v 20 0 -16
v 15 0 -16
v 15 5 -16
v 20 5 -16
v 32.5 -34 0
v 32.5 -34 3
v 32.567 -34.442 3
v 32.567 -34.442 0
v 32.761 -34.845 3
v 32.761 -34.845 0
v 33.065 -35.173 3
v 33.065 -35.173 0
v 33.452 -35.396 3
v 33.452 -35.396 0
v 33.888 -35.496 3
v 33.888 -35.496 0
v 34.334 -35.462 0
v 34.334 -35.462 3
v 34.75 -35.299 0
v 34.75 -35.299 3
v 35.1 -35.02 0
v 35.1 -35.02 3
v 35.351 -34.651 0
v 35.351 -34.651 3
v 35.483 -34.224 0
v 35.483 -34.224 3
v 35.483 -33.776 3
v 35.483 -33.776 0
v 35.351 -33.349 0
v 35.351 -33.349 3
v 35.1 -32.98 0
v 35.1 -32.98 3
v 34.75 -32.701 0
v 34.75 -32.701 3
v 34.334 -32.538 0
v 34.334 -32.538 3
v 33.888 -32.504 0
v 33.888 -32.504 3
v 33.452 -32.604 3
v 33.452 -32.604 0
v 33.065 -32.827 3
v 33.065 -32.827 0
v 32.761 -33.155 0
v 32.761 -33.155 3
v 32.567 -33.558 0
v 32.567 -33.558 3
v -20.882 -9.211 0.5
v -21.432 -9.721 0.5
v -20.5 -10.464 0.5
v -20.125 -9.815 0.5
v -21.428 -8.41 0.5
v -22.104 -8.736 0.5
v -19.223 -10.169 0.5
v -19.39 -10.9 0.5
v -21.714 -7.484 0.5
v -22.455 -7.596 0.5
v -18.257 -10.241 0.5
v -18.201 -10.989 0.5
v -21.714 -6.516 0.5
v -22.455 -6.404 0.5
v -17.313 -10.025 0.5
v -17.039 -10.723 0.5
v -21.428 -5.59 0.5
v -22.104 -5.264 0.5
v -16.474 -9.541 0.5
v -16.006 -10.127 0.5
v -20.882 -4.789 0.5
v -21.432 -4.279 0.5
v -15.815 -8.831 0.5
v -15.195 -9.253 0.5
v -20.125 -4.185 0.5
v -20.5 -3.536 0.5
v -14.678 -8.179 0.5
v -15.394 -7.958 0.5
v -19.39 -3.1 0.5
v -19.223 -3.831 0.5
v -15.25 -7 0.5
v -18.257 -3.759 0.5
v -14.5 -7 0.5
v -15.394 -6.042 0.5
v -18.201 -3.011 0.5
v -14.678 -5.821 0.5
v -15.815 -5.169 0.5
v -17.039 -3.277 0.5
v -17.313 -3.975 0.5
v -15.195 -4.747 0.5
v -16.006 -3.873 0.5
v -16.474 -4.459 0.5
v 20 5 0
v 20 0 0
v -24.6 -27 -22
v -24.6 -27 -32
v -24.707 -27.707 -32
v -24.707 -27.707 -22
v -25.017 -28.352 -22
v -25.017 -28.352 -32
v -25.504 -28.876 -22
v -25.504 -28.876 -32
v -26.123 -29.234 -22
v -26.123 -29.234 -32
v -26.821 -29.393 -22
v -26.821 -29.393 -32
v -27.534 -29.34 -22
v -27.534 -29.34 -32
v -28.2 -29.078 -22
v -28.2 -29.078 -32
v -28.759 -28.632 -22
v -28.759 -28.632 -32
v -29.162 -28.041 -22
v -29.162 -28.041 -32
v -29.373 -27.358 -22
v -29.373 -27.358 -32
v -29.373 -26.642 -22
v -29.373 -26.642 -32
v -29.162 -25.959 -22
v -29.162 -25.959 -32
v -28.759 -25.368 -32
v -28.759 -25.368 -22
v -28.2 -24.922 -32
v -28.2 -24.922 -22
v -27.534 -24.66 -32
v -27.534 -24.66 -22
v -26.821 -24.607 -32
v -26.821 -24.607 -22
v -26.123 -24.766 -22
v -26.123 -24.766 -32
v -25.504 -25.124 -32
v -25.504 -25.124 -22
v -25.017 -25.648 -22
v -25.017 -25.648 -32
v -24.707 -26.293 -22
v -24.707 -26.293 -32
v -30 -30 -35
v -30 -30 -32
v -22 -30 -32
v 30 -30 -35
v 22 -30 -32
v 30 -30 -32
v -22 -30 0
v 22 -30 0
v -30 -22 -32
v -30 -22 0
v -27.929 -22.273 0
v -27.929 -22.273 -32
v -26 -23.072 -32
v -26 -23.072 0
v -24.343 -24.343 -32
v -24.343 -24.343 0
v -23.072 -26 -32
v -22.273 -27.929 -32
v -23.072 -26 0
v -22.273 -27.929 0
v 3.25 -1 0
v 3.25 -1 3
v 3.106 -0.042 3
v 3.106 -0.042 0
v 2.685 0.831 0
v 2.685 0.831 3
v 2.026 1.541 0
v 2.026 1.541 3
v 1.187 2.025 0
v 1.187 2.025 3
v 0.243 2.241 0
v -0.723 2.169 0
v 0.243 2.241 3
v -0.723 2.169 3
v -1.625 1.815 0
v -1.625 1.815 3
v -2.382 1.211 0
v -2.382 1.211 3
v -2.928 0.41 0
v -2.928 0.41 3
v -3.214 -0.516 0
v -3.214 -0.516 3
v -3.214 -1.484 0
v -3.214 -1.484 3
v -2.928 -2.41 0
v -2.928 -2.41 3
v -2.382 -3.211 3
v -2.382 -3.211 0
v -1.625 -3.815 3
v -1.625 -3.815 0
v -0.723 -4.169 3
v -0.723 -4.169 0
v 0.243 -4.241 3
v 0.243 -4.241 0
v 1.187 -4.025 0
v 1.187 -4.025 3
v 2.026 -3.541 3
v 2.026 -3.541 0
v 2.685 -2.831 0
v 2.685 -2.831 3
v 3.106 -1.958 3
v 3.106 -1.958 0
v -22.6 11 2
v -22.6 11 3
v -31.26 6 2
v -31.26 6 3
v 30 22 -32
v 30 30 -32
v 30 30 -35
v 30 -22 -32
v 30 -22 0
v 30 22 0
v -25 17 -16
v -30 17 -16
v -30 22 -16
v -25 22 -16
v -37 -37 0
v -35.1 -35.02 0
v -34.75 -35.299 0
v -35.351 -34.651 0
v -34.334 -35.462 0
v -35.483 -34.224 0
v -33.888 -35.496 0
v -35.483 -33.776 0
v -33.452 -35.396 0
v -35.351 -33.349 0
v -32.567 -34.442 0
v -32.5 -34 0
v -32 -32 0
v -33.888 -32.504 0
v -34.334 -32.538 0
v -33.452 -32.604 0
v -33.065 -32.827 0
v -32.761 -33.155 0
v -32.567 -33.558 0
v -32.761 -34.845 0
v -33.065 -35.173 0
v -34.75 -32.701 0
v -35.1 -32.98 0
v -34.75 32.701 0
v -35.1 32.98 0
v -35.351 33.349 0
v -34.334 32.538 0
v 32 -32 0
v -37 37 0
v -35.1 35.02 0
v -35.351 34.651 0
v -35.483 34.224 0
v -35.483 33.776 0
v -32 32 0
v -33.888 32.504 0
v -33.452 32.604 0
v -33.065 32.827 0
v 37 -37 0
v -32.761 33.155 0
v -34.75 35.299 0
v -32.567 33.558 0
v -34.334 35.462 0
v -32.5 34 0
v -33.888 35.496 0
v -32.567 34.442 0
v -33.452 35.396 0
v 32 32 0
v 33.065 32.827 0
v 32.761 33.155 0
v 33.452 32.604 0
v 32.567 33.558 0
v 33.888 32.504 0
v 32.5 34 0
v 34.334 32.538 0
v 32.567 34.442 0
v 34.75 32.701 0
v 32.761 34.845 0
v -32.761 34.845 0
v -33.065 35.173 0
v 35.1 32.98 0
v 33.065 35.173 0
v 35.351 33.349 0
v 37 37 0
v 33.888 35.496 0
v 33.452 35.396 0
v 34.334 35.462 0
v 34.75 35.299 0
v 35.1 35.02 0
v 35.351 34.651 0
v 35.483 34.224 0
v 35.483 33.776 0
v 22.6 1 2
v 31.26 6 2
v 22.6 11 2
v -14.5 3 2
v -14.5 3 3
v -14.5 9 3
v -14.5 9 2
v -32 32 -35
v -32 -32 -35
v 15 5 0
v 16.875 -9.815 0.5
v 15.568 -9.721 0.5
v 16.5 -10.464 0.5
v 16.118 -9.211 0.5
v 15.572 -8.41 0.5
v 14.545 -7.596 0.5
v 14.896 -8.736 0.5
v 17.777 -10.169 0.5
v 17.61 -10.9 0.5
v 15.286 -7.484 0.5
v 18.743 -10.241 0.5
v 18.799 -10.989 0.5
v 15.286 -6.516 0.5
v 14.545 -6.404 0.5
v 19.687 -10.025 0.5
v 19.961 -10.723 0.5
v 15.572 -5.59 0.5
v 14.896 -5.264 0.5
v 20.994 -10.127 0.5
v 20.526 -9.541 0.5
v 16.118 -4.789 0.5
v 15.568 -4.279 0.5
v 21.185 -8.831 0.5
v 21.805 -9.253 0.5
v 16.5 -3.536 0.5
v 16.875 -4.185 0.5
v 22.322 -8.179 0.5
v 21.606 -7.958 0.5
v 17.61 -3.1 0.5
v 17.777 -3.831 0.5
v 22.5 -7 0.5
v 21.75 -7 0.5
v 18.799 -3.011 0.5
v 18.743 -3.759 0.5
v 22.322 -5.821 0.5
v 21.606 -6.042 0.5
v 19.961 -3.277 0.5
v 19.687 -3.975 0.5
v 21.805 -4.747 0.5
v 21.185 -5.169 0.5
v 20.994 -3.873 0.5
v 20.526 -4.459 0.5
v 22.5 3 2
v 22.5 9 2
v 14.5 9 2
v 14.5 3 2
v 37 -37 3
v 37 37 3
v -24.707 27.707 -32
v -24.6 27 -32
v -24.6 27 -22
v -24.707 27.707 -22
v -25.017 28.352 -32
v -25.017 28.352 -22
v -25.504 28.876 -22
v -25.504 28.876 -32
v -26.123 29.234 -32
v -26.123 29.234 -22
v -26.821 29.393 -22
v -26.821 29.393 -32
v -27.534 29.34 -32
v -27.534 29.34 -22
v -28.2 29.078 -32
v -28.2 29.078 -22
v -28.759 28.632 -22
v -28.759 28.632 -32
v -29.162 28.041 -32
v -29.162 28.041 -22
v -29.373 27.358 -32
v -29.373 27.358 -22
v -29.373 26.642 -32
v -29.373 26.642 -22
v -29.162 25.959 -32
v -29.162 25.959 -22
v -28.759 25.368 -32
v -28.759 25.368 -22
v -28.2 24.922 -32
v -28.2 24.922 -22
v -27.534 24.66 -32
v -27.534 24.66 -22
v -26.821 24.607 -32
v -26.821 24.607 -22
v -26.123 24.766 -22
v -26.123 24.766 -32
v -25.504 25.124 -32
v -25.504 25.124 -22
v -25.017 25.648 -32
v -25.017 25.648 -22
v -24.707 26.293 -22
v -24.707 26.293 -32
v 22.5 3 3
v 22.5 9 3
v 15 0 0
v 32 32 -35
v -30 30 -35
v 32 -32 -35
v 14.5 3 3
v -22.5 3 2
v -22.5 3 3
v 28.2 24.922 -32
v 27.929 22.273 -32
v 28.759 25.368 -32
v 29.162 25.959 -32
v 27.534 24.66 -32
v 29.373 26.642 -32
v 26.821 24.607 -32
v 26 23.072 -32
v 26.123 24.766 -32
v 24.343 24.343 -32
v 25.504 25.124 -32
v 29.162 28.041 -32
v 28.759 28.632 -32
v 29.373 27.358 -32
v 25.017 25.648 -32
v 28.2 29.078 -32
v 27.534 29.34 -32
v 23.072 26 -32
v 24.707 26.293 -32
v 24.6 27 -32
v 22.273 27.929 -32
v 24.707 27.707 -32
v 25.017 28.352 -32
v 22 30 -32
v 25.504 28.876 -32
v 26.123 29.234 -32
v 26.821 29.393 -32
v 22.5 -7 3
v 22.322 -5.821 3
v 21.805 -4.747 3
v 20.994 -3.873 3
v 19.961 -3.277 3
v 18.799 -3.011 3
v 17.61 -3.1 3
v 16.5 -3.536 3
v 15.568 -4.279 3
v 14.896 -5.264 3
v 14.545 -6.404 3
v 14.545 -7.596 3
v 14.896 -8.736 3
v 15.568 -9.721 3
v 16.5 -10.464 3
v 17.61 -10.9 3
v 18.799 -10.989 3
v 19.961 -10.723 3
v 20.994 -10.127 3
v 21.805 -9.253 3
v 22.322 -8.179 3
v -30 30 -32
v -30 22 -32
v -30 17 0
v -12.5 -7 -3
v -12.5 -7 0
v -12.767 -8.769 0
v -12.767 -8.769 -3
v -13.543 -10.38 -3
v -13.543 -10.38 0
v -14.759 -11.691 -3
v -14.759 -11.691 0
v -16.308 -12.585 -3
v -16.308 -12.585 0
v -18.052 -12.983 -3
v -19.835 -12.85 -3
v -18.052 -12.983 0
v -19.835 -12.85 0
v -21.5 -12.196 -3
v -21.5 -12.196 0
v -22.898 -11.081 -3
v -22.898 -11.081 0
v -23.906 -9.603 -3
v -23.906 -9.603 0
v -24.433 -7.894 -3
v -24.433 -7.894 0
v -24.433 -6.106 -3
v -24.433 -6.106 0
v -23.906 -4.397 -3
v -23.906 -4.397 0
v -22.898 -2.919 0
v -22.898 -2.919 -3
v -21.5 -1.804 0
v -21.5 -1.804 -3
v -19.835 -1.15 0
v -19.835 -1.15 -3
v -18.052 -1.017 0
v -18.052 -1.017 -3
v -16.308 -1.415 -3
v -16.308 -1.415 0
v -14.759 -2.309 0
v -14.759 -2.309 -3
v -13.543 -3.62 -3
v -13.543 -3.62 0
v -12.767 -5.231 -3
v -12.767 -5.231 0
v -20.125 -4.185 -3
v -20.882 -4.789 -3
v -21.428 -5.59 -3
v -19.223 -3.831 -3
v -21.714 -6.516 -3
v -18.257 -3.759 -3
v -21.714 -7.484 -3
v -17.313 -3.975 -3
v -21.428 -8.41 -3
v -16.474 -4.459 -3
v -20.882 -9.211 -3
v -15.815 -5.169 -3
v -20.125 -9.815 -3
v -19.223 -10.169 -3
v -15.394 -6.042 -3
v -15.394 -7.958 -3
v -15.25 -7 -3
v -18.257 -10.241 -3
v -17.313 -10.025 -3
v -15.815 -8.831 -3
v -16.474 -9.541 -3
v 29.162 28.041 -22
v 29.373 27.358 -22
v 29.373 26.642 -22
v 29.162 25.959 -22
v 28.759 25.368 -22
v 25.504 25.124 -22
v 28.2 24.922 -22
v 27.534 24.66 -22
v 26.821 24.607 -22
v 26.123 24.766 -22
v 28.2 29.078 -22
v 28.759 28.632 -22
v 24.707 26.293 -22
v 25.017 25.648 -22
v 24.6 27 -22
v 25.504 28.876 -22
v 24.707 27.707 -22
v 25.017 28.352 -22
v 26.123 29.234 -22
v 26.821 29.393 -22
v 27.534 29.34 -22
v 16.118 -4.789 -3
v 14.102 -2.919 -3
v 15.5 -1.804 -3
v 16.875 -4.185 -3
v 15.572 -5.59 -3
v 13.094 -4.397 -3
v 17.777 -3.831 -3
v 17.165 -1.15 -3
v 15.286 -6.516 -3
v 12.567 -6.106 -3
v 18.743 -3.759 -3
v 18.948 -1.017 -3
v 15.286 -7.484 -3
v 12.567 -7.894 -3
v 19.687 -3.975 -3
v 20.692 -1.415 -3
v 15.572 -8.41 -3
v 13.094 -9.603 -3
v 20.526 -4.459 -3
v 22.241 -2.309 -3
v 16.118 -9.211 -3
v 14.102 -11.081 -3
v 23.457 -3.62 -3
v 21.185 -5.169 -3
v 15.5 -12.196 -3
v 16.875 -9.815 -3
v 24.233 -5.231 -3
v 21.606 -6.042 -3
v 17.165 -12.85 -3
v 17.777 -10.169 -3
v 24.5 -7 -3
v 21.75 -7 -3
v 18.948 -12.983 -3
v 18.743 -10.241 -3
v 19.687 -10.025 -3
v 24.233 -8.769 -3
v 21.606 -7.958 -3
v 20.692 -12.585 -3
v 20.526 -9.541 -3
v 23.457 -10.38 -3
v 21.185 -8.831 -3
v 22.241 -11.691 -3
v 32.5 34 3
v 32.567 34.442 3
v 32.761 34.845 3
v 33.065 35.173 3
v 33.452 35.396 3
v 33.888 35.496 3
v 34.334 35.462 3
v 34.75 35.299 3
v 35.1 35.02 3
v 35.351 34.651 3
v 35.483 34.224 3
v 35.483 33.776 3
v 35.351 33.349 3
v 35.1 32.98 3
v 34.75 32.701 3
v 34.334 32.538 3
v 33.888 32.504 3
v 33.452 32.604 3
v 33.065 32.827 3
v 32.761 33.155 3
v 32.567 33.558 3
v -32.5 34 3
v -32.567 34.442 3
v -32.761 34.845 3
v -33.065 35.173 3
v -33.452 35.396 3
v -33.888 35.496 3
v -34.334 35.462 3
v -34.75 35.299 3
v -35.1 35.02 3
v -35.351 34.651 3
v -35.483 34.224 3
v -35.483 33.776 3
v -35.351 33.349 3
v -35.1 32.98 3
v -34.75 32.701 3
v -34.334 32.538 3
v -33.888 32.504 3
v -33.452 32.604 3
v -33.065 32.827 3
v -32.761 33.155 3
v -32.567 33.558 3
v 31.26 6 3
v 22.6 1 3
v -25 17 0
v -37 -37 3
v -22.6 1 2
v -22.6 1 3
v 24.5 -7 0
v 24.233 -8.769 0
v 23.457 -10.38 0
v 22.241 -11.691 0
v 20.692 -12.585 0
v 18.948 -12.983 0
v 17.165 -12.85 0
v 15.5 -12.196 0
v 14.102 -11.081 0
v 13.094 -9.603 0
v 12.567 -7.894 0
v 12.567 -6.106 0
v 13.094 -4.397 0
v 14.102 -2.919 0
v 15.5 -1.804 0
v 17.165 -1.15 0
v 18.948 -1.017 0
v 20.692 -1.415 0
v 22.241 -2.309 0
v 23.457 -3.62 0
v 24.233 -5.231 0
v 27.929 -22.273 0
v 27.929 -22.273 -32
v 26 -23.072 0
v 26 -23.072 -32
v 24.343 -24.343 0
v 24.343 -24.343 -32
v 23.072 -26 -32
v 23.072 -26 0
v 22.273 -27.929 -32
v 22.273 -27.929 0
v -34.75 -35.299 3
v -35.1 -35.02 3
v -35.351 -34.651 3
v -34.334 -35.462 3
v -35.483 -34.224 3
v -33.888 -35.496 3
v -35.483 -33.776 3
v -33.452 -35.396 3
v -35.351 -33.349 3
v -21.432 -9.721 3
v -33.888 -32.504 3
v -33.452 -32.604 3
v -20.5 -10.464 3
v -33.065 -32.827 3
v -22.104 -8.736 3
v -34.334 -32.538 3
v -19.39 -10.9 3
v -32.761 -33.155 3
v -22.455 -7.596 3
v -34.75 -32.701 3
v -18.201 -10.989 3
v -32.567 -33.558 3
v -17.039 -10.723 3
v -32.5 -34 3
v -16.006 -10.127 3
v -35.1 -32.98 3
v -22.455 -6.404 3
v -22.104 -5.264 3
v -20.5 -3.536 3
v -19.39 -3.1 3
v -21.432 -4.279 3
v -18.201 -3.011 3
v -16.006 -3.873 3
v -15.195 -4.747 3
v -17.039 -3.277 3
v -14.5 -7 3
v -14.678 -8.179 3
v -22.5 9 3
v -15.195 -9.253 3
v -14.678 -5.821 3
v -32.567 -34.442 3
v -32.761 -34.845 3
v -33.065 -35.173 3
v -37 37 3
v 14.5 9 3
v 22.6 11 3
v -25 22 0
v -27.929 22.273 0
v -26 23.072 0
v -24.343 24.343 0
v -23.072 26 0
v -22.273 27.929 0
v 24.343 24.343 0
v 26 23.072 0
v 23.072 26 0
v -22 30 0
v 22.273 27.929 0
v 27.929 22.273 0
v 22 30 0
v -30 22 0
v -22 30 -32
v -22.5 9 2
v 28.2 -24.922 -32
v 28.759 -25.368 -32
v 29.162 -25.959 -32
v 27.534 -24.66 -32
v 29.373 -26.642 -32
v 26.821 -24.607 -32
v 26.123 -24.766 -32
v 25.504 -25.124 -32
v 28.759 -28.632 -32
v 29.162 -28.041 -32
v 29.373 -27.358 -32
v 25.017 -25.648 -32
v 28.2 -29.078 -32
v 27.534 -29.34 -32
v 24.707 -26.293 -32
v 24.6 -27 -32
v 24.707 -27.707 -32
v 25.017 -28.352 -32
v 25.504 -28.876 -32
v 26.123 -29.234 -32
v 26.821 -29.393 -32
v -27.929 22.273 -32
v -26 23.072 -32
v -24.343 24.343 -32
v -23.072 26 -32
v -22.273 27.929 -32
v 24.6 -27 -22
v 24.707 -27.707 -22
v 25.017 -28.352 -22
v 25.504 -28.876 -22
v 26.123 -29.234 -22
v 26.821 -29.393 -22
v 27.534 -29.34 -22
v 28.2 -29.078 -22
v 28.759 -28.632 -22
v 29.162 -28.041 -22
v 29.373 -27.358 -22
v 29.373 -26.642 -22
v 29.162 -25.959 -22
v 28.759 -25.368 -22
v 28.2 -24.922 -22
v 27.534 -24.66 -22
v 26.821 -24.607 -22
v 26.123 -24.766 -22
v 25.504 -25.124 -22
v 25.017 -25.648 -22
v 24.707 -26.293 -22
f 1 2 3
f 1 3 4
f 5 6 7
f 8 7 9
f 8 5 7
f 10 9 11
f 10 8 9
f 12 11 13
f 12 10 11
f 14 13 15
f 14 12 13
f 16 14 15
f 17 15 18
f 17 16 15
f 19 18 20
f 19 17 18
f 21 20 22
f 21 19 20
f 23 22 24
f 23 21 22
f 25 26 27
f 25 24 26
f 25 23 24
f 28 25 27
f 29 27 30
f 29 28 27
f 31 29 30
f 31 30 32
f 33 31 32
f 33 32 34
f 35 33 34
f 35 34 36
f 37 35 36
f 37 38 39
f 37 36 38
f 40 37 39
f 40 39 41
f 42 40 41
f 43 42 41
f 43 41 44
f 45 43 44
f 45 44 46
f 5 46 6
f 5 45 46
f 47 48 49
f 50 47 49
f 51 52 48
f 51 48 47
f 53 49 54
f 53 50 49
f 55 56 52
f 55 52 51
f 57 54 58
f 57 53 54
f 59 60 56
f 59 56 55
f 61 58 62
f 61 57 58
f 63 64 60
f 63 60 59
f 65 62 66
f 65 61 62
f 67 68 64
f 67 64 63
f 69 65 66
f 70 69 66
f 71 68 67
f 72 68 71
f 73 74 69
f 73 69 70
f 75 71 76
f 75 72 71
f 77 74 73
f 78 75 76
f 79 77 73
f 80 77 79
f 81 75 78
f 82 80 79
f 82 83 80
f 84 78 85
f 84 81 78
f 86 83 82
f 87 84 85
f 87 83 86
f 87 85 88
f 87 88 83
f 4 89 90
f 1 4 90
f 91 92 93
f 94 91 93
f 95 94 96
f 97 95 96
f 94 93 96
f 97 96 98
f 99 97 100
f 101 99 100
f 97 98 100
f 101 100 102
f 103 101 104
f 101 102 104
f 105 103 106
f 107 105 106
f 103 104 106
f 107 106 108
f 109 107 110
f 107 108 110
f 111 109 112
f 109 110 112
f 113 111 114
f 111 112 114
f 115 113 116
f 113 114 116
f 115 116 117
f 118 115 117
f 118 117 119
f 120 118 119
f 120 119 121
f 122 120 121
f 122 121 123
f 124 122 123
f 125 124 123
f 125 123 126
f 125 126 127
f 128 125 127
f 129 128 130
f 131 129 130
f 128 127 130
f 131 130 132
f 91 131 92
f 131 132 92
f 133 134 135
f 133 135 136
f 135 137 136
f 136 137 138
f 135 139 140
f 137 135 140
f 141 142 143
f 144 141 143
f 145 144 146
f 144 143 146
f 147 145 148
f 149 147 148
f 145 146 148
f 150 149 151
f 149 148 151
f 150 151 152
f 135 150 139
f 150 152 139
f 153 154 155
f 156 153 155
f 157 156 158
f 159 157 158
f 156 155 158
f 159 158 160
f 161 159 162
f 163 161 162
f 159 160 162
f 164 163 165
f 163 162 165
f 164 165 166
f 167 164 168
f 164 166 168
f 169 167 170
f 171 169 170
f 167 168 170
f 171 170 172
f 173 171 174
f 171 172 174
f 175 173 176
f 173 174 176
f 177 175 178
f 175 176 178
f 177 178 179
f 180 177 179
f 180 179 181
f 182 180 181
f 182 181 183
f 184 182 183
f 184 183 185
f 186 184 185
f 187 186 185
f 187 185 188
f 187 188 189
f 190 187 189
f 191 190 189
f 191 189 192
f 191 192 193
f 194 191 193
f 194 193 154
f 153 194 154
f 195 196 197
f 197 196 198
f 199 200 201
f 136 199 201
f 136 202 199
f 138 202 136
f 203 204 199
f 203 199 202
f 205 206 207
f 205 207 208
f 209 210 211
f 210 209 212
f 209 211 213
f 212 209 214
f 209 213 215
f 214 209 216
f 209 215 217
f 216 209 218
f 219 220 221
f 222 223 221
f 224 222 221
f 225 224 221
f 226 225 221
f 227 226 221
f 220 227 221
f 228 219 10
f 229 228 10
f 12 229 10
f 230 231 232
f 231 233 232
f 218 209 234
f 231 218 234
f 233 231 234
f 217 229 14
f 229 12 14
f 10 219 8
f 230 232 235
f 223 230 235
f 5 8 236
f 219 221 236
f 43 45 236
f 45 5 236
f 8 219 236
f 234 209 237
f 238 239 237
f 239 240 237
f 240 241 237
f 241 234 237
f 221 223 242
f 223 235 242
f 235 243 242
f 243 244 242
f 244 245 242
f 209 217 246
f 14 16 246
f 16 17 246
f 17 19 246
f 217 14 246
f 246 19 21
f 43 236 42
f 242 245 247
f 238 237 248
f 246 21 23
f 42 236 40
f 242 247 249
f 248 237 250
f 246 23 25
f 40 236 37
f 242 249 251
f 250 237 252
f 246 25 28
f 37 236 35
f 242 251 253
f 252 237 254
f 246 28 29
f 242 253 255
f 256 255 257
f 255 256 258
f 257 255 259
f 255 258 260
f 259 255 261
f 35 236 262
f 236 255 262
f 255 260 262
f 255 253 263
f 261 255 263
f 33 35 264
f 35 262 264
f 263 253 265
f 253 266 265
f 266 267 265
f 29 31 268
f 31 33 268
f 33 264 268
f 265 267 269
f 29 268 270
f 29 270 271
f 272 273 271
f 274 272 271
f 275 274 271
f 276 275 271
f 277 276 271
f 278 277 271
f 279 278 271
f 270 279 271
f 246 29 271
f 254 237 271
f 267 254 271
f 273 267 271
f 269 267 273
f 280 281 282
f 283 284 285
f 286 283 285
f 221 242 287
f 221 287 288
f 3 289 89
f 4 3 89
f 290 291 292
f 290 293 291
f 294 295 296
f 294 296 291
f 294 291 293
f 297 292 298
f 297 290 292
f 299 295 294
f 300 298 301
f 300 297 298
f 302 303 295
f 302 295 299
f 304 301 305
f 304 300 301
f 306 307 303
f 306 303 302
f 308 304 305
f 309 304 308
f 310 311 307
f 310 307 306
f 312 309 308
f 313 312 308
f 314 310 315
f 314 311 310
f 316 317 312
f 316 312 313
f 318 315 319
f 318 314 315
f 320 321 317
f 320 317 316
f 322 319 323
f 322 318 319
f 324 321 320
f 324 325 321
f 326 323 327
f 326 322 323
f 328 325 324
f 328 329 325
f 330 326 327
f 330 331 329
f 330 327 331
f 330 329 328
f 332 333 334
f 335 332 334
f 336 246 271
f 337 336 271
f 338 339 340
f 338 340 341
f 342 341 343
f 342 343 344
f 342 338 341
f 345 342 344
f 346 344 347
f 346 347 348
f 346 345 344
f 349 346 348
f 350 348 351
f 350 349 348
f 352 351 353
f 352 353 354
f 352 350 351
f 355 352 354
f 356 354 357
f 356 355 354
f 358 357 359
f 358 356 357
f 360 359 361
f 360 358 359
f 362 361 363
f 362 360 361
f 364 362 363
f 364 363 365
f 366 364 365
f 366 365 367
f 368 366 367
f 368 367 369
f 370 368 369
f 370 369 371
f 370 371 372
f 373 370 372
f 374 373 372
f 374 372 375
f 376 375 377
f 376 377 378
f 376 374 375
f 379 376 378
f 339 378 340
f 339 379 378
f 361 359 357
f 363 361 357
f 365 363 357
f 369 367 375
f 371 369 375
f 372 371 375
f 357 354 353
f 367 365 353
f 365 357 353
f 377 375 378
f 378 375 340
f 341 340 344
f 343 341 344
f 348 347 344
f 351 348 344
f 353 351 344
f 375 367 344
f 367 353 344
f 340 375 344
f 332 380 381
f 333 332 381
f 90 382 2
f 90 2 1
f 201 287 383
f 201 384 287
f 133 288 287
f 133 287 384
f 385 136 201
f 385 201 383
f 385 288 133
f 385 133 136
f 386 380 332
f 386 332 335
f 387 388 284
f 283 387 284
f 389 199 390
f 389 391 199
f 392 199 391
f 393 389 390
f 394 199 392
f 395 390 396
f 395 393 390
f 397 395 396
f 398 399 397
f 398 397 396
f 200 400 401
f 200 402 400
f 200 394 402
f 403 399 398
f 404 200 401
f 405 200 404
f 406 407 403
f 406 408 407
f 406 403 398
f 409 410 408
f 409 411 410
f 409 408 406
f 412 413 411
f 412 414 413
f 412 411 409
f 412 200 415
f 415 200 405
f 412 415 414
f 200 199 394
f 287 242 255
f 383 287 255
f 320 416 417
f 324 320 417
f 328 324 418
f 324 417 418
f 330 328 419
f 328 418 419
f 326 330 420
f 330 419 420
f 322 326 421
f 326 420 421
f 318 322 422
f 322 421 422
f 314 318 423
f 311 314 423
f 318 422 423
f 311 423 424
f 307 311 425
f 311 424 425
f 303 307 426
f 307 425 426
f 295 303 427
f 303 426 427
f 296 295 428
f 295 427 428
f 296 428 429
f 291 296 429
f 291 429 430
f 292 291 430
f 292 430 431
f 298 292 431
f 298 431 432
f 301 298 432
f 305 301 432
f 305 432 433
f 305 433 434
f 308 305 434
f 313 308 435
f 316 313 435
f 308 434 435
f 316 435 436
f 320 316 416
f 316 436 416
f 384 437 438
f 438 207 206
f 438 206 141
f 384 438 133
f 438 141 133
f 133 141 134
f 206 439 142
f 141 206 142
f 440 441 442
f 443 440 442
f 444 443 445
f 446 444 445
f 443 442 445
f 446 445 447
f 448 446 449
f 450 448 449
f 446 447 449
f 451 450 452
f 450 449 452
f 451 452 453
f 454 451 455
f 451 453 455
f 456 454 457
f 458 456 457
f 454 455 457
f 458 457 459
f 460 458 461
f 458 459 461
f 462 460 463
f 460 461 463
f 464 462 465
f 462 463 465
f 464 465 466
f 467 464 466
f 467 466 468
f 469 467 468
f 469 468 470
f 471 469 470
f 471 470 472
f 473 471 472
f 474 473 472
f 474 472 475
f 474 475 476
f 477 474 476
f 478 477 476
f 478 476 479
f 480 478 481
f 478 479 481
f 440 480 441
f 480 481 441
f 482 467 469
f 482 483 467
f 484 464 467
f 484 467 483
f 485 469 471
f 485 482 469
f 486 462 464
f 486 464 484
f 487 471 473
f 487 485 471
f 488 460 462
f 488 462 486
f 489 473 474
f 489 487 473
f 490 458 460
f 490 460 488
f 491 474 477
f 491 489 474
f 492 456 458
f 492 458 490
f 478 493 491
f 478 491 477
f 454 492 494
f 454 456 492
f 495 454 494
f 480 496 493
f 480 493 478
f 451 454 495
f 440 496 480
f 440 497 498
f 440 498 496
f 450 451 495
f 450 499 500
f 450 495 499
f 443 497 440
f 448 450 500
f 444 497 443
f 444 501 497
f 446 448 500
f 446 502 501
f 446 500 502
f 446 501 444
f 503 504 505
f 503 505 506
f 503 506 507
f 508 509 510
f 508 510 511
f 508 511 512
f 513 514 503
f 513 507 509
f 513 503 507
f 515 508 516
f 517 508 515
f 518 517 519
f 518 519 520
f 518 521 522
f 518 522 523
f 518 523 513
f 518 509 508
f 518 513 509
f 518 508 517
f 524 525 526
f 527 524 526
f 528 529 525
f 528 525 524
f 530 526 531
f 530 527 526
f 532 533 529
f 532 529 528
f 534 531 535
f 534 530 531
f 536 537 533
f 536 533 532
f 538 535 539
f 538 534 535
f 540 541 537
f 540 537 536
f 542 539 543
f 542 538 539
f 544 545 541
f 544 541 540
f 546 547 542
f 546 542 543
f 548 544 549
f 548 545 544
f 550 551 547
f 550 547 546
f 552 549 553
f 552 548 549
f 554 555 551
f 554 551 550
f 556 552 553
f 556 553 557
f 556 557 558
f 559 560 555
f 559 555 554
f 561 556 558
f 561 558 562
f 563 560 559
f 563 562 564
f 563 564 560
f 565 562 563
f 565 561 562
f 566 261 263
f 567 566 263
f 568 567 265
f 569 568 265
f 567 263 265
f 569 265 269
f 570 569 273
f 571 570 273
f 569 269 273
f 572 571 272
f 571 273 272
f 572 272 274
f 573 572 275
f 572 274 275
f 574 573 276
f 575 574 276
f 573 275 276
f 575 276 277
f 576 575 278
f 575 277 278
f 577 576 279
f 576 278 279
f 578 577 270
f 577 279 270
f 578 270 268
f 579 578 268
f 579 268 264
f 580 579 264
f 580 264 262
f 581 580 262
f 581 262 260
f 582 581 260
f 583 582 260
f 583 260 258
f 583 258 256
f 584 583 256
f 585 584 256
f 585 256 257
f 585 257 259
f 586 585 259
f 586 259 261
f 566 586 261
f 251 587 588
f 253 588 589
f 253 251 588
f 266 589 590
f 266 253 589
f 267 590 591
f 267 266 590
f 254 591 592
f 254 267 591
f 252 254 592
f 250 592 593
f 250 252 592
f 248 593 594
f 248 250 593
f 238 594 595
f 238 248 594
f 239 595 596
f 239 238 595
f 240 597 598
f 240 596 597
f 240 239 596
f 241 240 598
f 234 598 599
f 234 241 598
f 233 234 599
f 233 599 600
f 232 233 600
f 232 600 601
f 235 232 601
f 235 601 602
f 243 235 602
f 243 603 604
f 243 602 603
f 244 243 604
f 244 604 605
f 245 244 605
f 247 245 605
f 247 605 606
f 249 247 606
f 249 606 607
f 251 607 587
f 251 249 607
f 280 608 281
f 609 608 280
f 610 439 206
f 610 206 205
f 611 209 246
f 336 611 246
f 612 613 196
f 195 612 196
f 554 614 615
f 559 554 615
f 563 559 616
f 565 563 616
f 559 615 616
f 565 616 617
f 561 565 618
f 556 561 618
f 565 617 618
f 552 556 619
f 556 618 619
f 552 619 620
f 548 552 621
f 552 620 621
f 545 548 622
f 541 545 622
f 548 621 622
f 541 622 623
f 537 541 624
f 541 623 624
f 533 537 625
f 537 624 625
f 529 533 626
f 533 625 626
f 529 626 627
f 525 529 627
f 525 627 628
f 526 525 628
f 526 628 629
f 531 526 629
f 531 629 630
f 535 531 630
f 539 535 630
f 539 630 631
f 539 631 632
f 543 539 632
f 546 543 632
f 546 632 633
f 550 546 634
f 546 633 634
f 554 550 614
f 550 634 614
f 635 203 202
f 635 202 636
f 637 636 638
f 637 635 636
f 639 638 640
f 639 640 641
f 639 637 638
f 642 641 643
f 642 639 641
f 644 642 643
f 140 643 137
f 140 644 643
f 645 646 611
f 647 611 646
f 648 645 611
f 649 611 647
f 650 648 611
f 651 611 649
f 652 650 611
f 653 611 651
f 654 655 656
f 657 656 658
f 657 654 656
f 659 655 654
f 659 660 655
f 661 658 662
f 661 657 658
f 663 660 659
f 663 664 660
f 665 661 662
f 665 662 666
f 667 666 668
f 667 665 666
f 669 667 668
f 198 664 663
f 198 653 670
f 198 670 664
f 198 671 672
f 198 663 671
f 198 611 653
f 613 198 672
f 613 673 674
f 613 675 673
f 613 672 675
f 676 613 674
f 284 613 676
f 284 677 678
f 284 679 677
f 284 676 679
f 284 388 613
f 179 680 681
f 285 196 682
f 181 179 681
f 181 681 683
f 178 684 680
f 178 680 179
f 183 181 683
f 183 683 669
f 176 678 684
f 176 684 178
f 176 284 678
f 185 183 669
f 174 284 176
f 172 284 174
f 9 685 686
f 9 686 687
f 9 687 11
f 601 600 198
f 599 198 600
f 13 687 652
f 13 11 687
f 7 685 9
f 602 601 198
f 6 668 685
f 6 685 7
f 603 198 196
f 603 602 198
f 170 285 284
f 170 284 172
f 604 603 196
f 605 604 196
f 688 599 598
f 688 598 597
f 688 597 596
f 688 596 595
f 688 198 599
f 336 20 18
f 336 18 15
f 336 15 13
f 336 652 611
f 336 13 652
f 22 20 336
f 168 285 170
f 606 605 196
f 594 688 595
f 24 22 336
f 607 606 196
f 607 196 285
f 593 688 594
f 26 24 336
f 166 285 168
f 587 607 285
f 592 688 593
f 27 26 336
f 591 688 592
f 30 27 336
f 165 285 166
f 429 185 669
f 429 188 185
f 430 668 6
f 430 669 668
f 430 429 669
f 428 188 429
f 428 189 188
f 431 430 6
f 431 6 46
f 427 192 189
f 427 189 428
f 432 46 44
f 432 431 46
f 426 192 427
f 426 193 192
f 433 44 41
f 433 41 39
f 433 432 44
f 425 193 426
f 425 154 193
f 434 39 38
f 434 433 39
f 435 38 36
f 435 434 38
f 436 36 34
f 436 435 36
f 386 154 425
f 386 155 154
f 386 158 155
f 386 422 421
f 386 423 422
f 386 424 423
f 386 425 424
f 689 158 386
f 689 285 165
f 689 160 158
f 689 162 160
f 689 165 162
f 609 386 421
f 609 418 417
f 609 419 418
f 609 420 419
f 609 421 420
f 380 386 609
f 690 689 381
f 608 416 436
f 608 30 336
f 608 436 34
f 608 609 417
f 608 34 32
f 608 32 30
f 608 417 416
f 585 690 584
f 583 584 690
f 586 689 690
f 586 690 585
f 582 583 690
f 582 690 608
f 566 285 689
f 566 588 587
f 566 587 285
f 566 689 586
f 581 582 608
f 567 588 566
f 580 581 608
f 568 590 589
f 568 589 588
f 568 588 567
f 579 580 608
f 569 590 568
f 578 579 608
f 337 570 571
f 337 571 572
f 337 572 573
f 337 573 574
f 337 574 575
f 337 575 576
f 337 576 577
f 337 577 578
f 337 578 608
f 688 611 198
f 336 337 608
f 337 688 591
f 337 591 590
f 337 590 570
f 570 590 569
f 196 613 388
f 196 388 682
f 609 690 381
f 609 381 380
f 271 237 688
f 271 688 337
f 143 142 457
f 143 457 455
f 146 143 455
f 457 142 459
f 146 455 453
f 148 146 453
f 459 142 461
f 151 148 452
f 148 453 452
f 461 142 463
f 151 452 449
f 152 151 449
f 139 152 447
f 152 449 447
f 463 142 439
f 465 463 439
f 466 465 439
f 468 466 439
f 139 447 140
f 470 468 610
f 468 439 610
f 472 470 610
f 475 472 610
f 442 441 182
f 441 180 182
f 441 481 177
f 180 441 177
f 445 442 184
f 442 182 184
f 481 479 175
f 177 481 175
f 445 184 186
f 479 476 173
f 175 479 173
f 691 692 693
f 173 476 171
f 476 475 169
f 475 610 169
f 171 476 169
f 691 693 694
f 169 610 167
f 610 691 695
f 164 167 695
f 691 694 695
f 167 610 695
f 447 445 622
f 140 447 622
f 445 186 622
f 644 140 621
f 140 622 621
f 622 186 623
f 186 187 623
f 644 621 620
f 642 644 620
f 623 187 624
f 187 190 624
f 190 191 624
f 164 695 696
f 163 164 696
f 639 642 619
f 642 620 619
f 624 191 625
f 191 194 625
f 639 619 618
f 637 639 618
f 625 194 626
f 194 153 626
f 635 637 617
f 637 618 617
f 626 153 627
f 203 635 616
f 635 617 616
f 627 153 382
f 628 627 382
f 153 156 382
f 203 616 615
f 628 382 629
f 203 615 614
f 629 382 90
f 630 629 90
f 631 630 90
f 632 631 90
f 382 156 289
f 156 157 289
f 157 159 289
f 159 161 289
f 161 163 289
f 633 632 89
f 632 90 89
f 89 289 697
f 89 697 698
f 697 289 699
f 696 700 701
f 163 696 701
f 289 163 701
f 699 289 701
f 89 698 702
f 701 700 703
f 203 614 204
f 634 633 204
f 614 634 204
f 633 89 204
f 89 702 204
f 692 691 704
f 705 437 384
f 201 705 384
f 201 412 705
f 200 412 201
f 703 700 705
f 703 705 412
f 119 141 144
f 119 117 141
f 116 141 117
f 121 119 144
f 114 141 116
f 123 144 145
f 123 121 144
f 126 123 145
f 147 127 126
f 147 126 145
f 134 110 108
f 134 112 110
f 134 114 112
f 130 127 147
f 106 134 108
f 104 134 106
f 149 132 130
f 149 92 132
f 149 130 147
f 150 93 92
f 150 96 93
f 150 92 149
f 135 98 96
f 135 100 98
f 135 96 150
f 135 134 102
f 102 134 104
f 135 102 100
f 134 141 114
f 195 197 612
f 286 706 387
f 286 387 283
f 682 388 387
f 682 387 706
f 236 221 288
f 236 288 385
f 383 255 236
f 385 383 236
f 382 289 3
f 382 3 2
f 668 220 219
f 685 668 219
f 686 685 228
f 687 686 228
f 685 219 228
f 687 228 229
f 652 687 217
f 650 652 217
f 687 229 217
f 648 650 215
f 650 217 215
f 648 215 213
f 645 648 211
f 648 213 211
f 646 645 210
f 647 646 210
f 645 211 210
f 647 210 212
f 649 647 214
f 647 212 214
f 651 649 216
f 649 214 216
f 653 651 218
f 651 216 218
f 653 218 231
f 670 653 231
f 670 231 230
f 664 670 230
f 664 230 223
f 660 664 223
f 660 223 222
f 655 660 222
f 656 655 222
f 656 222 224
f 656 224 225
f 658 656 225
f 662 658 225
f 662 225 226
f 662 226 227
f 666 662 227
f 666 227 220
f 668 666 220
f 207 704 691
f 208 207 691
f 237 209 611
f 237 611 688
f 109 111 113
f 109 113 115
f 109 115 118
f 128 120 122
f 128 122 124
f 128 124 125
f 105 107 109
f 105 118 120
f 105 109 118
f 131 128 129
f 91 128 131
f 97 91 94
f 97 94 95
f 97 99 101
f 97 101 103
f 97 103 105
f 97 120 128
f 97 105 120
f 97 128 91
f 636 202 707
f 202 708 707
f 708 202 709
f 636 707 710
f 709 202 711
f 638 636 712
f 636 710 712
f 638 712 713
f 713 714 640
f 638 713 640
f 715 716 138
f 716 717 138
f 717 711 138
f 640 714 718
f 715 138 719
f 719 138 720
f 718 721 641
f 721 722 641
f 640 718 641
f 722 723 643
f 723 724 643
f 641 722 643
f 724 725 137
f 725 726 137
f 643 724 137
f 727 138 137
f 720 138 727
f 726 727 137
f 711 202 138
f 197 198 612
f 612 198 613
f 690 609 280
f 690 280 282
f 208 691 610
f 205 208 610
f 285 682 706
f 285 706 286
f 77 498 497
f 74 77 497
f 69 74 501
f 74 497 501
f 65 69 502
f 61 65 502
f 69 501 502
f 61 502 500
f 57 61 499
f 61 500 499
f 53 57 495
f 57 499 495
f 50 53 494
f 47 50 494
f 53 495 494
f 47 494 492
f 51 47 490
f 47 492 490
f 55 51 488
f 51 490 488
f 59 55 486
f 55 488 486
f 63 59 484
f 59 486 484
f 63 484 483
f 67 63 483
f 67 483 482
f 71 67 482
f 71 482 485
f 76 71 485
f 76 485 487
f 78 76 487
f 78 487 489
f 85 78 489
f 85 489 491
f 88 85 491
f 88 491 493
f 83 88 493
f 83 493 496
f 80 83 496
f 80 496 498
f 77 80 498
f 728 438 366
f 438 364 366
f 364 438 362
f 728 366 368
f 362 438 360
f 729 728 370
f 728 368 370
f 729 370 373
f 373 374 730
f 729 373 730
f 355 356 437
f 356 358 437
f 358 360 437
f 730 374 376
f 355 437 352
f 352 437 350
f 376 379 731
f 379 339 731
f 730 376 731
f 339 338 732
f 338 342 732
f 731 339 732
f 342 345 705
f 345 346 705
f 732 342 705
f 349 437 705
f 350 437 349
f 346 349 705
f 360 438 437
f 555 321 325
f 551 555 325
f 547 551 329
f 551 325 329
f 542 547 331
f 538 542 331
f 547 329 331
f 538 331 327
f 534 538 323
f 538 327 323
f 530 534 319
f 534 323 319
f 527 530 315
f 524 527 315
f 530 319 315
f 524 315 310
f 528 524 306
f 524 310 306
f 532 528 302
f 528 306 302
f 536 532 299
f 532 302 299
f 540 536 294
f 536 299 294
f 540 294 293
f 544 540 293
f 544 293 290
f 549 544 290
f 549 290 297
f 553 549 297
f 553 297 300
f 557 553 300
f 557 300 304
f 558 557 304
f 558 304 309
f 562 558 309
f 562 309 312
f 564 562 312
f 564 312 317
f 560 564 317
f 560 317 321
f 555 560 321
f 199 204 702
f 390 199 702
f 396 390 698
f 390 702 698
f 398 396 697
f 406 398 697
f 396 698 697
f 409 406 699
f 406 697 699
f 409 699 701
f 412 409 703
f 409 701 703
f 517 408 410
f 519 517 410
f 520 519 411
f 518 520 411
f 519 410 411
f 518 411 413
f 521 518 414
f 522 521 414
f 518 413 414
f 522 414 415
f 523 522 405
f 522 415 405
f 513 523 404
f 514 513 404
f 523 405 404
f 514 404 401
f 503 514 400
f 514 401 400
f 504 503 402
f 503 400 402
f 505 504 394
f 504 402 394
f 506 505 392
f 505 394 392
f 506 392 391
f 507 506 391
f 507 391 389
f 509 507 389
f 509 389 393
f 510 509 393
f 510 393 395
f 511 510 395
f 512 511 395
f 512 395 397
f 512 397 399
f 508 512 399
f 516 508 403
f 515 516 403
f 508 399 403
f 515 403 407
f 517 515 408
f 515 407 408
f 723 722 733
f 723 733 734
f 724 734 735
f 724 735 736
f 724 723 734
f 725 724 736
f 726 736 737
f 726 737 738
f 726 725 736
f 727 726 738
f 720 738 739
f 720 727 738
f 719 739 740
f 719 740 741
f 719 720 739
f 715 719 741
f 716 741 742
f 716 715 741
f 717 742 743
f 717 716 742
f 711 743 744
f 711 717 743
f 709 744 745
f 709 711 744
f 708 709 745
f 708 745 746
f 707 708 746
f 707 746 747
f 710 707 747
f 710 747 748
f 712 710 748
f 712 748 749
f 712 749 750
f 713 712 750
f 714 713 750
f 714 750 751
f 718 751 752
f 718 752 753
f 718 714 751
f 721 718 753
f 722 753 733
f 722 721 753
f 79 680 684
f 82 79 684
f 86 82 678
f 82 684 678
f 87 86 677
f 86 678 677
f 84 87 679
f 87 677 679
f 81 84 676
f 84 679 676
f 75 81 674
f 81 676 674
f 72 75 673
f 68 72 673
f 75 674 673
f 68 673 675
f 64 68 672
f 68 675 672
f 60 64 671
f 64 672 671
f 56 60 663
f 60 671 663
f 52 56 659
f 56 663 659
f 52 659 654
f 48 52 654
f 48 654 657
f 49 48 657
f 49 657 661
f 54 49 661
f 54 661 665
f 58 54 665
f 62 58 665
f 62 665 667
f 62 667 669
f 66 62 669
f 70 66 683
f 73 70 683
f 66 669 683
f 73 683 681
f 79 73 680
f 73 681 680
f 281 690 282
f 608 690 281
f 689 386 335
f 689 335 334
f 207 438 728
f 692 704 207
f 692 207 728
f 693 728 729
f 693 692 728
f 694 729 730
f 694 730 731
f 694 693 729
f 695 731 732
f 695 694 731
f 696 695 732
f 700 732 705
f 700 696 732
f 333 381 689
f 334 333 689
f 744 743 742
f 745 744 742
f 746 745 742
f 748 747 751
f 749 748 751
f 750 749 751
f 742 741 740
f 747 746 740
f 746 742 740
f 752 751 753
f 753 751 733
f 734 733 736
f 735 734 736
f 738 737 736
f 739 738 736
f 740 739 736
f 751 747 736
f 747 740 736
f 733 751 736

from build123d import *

# Parameters (mm, degrees)
SKETCH_W                   = 74
SKETCH_H                   = 74
PAD_DEPTH                  = 3
SKETCH002_W                = 64
SKETCH002_H                = 64
SKETCH002_W_2              = 60
SKETCH002_H_2              = 60
PAD001_DEPTH               = 35
SKETCH003_R                = 1.5
POCKET_DEPTH               = 225.675651
PAD002_DEPTH               = 32
SKETCH005_R                = 2.4
POCKET001_DEPTH            = 10
SKETCH003_MIRRORED_2_R     = 1.5
POCKET_MIRRORED_2_DEPTH    = 225.675651
PAD002_MIRRORED_2_DEPTH    = 32
SKETCH005_MIRRORED_2_R     = 2.4
POCKET001_MIRRORED_2_DEPTH = 10
SKETCH006_R                = 3.25
POCKET002_DEPTH            = 38.001
SKETCH008_R                = 4
POCKET003_DEPTH            = 2.5
SKETCH009_R                = 6
PAD003_DEPTH               = 3
SKETCH010_R                = 3.25
POCKET004_DEPTH            = 6.001
SKETCH011_R                = 3.25
POCKET005_DEPTH            = 38.001
SKETCH012_W                = 8
SKETCH012_H                = 6
POCKET006_DEPTH            = 1
SKETCH013_W                = 5
SKETCH013_H                = 5
PAD004_DEPTH               = 16


with BuildPart() as part:
    # Sketch → Pad (new body)
    with BuildSketch(Plane.XY):
        Rectangle(SKETCH_W, SKETCH_H)
    extrude(amount=PAD_DEPTH)

    # Sketch002 (on Face5 of Pad) → Pad001 (join)
    with BuildSketch(Plane(origin=(0, 0, 0), x_dir=(1, 0, 0), z_dir=(0, 0, -1))):
        Rectangle(SKETCH002_W, SKETCH002_H)
        Rectangle(SKETCH002_W_2, SKETCH002_H_2, mode=Mode.SUBTRACT)
    extrude(amount=PAD001_DEPTH)

    # Sketch003 (on Face4 of Pad001) → Pocket (cut, through all)
    with BuildSketch(Plane(origin=(0, 0, 0), x_dir=(1, 0, 0), z_dir=(0, 0, -1))):
        with Locations((-34, 34)):
            Circle(SKETCH003_R)
    pocket = extrude(amount=-POCKET_DEPTH, mode=Mode.SUBTRACT)

    # Sketch004 (on Face17 of Pocket) → Pad002 (join)
    with BuildSketch(Plane(origin=(0, 0, 0), x_dir=(1, 0, 0), z_dir=(0, 0, -1))):
        with BuildLine():
            ThreePointArc((-30, 22), (-24.343146, 24.343146), (-22, 30))
            Line((-30, 30), (-22, 30))
            Line((-30, 30), (-30, 22))
        make_face()
    pad002 = extrude(amount=PAD002_DEPTH)

    # Sketch005 (on Face17 of Pad002) → Pocket001 (cut)
    with BuildSketch(Plane(origin=(0, 0, -32), x_dir=(1, 0, 0), z_dir=(0, 0, -1))):
        with Locations((-27, 27)):
            Circle(SKETCH005_R)
    pocket001 = extrude(amount=-POCKET001_DEPTH, mode=Mode.SUBTRACT)

    # Sketch003 Mirrored 2 → Pocket Mirrored 2 (cut, through all)
    with BuildSketch(Plane(origin=(0, 0, 0), x_dir=(-1, 0, 0), z_dir=(0, 0, 1))):
        with Locations((-34, 34)):
            Circle(SKETCH003_MIRRORED_2_R)
    pocket_mirrored_2 = extrude(amount=POCKET_MIRRORED_2_DEPTH, mode=Mode.SUBTRACT)

    # Sketch004 Mirrored 2 → Pad002 Mirrored 2 (add)
    with BuildSketch(Plane(origin=(0, 0, 0), x_dir=(-1, 0, 0), z_dir=(0, 0, 1))):
        with BuildLine():
            ThreePointArc((-30, 22), (-24.343146, 24.343146), (-22, 30))
            Line((-30, 30), (-22, 30))
            Line((-30, 30), (-30, 22))
        make_face()
    pad002_mirrored_2 = extrude(amount=-PAD002_MIRRORED_2_DEPTH)

    # Sketch005 Mirrored 2 → Pocket001 Mirrored 2 (cut)
    with BuildSketch(Plane(origin=(0, 0, -32), x_dir=(-1, 0, 0), z_dir=(0, 0, 1))):
        with Locations((-27, 27)):
            Circle(SKETCH005_MIRRORED_2_R)
    pocket001_mirrored_2 = extrude(amount=POCKET001_MIRRORED_2_DEPTH, mode=Mode.SUBTRACT)

    # Mirrored001: Pocket, Pad002, Pocket001, Pocket Mirrored 2, Pad002 Mirrored 2, Pocket001 Mirrored 2 across Sketch003 H_Axis
    add(pocket.mirror(Plane(origin=(0, 0, 0), x_dir=(0, 0, -1), z_dir=(0, -1, 0))), mode=Mode.SUBTRACT)
    add(pad002.mirror(Plane(origin=(0, 0, 0), x_dir=(0, 0, -1), z_dir=(0, -1, 0))))
    add(pocket001.mirror(Plane(origin=(0, 0, 0), x_dir=(0, 0, -1), z_dir=(0, -1, 0))), mode=Mode.SUBTRACT)
    add(pocket_mirrored_2.mirror(Plane(origin=(0, 0, 0), x_dir=(0, 0, -1), z_dir=(0, -1, 0))), mode=Mode.SUBTRACT)
    add(pad002_mirrored_2.mirror(Plane(origin=(0, 0, 0), x_dir=(0, 0, -1), z_dir=(0, -1, 0))))
    add(pocket001_mirrored_2.mirror(Plane(origin=(0, 0, 0), x_dir=(0, 0, -1), z_dir=(0, -1, 0))), mode=Mode.SUBTRACT)

    # Sketch006 (on Face36 of MultiTransform) → Pocket002 (cut, through all)
    with BuildSketch(Plane.XY.offset(3)):
        with Locations((0, -1)):
            Circle(SKETCH006_R)
    extrude(amount=-POCKET002_DEPTH, mode=Mode.SUBTRACT)

    # Sketch008 (on Face23 of Pocket002) → Pocket003 (cut)
    with BuildSketch(Plane.XY.offset(3)):
        with Locations((-18.5, -7)):
            Circle(SKETCH008_R)
        with Locations((18.5, -7)):
            Circle(SKETCH008_R)
    extrude(amount=-POCKET003_DEPTH, mode=Mode.SUBTRACT)

    # Sketch009 (on Face4 of Pocket003) → Pad003 (join)
    with BuildSketch(Plane(origin=(0, 0, 0), x_dir=(1, 0, 0), z_dir=(0, 0, -1))):
        with Locations((18.5, 7)):
            Circle(SKETCH009_R)
        with Locations((-18.5, 7)):
            Circle(SKETCH009_R)
    extrude(amount=PAD003_DEPTH)

    # Sketch010 (on Face25 of Pad003) → Pocket004 (cut, through all)
    with BuildSketch(Plane(origin=(0, 0, -3), x_dir=(1, 0, 0), z_dir=(0, 0, -1))):
        with Locations((-18.5, 7)):
            Circle(SKETCH010_R)
    extrude(amount=-POCKET004_DEPTH, mode=Mode.SUBTRACT)

    # Sketch011 (on Face27 of Pocket004) → Pocket005 (cut, through all)
    with BuildSketch(Plane.XY.offset(3)):
        with Locations((18.5, -7)):
            Circle(SKETCH011_R)
    extrude(amount=-POCKET005_DEPTH, mode=Mode.SUBTRACT)

    # Sketch012 (on Face27 of Pocket005) → Pocket006 (cut)
    with BuildSketch(Plane.XY.offset(3)):
        with Locations((-18.5, 6)):
            Rectangle(SKETCH012_W, SKETCH012_H)
        Polygon((-22.6, 1), (-22.6, 11), (-31.260254, 6), align=None)
    pocket006 = extrude(amount=-POCKET006_DEPTH, mode=Mode.SUBTRACT)

    # Mirrored002: Pocket006 across Sketch012 V_Axis
    add(pocket006.mirror(Plane(origin=(0, 0, 3), x_dir=(0, 0, 1), z_dir=(1, 0, 0))), mode=Mode.SUBTRACT)

    # Sketch013 (on Face4 of MultiTransform001) → Pad004 (join)
    with BuildSketch(Plane(origin=(0, 0, 0), x_dir=(1, 0, 0), z_dir=(0, 0, -1))):
        with Locations((-27.5, -19.5)):
            Rectangle(SKETCH013_W, SKETCH013_H)
        with Locations((17.5, -2.5)):
            Rectangle(SKETCH013_W, SKETCH013_H)
    extrude(amount=PAD004_DEPTH)


solid = part.part
